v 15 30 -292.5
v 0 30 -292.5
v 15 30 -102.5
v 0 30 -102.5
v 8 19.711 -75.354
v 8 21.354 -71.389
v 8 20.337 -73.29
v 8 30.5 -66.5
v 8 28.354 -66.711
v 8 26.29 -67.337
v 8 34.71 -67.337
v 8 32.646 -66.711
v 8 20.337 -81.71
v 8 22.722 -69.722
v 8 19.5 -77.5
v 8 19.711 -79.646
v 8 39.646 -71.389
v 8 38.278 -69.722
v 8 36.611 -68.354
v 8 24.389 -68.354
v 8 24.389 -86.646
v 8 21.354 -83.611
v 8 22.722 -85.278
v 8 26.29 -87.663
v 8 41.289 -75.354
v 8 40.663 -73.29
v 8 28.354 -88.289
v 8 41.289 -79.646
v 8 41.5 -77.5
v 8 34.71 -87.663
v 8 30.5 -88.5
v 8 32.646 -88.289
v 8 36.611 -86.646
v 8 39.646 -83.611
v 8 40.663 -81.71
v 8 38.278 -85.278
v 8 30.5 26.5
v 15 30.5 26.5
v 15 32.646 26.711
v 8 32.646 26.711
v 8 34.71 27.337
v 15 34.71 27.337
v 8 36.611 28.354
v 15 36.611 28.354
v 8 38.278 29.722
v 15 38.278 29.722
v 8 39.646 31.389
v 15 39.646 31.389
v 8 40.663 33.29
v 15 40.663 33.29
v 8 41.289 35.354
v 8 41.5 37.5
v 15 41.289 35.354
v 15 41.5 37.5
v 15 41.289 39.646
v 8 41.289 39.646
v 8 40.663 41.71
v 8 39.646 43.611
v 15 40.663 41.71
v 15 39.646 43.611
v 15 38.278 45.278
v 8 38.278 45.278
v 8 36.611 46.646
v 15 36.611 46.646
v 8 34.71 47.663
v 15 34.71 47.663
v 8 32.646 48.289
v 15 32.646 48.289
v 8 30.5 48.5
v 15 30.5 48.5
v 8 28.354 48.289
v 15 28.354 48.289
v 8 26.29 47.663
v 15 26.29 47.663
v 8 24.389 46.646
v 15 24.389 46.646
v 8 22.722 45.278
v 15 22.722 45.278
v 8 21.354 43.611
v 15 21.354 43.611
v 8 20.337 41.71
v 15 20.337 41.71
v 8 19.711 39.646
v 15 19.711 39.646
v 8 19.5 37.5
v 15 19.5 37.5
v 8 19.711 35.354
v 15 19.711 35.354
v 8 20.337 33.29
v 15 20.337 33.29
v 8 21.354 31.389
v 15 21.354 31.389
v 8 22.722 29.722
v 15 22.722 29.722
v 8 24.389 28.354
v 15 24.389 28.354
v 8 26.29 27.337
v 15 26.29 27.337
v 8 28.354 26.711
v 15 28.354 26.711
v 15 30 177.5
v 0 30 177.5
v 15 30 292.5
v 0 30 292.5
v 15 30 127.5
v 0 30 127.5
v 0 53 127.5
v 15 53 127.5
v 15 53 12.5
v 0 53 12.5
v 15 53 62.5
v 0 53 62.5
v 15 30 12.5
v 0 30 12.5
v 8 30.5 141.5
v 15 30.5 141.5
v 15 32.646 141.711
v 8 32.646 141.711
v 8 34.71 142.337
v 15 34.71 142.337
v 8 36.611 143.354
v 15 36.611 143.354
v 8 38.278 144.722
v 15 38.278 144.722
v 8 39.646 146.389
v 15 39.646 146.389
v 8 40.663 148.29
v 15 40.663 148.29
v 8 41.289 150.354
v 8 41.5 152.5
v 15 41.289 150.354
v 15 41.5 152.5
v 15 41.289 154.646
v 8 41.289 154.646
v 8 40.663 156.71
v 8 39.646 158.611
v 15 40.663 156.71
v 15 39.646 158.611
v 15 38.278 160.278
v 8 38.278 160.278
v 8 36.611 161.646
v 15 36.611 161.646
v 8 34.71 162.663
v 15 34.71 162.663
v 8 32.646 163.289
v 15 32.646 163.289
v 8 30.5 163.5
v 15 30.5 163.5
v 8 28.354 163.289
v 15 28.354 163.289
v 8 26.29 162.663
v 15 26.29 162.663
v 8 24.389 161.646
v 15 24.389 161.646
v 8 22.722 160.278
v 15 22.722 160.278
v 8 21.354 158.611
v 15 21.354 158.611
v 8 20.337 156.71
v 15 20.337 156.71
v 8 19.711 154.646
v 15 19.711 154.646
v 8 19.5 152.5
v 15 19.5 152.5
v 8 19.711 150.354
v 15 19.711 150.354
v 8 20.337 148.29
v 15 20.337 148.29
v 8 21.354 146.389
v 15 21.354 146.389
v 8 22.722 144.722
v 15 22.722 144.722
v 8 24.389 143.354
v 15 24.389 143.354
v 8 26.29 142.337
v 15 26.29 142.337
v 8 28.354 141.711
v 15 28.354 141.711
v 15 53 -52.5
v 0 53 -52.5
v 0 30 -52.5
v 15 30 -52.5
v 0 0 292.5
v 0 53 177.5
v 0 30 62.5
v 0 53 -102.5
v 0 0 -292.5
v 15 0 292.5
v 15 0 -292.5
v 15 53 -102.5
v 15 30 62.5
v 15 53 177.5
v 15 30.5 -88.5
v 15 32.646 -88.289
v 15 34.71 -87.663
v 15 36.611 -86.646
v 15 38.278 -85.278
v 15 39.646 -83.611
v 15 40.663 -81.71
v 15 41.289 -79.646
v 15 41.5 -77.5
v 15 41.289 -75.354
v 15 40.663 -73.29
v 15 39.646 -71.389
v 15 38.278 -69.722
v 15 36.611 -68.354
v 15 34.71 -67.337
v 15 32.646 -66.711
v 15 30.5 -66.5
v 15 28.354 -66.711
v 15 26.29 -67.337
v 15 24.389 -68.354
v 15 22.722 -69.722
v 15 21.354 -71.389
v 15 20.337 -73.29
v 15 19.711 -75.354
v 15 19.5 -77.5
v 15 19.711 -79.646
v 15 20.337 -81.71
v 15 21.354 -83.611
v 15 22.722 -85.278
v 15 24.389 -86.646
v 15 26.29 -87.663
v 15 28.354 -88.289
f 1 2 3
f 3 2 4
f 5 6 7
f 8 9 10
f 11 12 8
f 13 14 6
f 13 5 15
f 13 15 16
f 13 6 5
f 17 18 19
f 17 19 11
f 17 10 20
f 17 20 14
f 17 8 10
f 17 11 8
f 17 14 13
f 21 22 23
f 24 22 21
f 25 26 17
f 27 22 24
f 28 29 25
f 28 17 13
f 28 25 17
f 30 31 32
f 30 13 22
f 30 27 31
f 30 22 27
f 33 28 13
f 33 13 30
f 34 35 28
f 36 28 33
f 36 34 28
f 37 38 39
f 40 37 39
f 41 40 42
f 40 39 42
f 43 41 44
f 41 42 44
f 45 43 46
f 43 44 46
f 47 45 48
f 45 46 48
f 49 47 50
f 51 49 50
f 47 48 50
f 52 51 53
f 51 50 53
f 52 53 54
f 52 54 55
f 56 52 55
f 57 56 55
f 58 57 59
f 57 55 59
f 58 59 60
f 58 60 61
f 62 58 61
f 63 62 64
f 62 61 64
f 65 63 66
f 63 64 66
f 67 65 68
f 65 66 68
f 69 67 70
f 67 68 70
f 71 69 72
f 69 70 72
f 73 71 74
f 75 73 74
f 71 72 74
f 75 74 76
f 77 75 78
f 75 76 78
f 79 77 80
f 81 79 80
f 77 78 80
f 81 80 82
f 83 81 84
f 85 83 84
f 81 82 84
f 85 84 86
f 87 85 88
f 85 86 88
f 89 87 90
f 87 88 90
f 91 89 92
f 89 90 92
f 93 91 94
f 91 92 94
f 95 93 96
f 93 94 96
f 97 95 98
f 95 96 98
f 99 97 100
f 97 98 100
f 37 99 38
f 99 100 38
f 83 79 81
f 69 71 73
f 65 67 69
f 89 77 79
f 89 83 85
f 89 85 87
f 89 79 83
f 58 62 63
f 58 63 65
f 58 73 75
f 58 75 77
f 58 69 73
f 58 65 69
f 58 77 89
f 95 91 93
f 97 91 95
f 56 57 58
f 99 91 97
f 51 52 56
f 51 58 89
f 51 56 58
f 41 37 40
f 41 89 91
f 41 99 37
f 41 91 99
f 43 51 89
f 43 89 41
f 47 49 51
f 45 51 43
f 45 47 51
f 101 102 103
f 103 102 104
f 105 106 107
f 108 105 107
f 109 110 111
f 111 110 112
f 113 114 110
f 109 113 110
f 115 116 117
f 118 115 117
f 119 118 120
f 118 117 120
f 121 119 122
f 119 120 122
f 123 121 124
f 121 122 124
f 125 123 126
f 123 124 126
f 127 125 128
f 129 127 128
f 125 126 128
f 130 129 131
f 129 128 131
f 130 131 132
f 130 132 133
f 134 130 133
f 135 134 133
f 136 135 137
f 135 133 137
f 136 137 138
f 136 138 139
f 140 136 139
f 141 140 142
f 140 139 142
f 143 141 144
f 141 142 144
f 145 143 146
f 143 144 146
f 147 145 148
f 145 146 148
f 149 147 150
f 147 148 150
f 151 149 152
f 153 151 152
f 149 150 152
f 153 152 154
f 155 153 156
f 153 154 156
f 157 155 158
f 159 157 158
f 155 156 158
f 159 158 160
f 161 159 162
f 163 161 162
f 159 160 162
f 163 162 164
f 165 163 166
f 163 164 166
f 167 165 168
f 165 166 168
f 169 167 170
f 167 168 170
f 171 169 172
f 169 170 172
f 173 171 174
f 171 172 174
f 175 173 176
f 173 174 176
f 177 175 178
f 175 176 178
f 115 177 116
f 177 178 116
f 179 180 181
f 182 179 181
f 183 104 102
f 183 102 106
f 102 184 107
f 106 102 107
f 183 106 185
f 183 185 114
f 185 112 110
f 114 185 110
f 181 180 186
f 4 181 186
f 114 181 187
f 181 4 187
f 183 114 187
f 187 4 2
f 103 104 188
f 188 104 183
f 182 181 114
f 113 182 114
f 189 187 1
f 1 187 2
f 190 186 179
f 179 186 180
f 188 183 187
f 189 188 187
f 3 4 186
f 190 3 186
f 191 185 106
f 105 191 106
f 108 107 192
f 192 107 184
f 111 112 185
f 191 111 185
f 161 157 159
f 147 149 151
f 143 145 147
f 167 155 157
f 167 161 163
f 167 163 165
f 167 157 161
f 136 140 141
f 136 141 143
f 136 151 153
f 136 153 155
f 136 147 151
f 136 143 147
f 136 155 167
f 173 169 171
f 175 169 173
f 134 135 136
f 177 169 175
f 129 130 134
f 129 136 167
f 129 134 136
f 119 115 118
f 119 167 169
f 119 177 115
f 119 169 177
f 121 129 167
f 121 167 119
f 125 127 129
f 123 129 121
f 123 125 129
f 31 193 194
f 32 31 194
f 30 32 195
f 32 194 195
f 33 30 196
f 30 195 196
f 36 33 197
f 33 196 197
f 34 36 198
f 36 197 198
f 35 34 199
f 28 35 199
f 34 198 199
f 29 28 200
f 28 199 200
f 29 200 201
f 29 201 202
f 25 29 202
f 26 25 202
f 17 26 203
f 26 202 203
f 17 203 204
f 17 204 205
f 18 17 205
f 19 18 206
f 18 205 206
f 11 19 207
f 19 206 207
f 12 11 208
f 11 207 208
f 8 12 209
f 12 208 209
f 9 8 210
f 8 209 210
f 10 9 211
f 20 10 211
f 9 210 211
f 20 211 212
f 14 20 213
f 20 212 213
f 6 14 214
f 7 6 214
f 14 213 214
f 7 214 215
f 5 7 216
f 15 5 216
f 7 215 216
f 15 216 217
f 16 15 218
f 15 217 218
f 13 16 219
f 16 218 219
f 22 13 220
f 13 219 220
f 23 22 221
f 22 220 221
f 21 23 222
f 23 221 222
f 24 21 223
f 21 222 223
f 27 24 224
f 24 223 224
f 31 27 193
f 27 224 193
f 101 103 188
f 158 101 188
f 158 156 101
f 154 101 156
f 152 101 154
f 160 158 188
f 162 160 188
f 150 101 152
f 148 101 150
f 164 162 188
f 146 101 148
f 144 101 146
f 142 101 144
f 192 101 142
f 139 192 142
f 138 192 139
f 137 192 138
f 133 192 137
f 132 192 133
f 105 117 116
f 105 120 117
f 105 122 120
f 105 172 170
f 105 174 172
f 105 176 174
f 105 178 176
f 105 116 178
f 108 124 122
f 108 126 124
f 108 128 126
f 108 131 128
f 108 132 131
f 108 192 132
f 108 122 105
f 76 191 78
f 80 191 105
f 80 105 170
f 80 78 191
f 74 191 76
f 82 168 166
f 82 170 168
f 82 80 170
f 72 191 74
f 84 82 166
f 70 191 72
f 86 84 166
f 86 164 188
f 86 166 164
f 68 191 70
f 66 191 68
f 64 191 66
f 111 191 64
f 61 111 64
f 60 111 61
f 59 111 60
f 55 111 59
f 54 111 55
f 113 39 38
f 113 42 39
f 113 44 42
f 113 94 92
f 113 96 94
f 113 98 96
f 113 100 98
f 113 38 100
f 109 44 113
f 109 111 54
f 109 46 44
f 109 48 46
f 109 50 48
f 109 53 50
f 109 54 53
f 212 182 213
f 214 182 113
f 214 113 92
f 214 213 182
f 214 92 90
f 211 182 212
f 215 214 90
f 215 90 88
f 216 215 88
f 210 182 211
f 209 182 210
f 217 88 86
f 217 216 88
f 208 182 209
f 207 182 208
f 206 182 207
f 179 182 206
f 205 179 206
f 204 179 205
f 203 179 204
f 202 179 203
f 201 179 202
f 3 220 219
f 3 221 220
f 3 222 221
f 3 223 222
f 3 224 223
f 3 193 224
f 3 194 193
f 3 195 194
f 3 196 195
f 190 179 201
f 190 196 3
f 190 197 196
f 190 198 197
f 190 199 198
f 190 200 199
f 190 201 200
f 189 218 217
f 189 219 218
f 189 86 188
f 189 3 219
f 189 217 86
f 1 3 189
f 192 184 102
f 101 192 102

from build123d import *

# Parameters (mm, degrees)
SALIENTE_EXTRUIR1_DEPTH = 15
CROQUIS2_R              = 11
CORTAR_EXTRUIR1_DEPTH   = 7


with BuildPart() as part:
    # Croquis1 → Saliente-Extruir1 (new body)
    with BuildSketch(Plane(origin=(0, 0, 0), x_dir=(0, 0, -1), z_dir=(1, 0, 0))):
        Polygon((-292.5, 0), (292.5, 0), (292.5, 30), (102.5, 30), (102.5, 53), (52.5, 53), (52.5, 30), (-12.5, 30), (-12.5, 53), (-62.5, 53), (-62.5, 30), (-127.5, 30), (-127.5, 53), (-177.5, 53), (-177.5, 30), (-292.5, 30), align=None)
    extrude(amount=SALIENTE_EXTRUIR1_DEPTH)

    # Croquis2 → Cortar-Extruir1 (cut)
    with BuildSketch(Plane(origin=(15, 0, 0), x_dir=(0, 0, -1), z_dir=(1, 0, 0))):
        with Locations((-37.5, 30.5)):
            Circle(CROQUIS2_R)
        with Locations((-152.5, 30.5)):
            Circle(CROQUIS2_R)
        with Locations((77.5, 30.5)):
            Circle(CROQUIS2_R)
    extrude(amount=-CORTAR_EXTRUIR1_DEPTH, mode=Mode.SUBTRACT)


solid = part.part
